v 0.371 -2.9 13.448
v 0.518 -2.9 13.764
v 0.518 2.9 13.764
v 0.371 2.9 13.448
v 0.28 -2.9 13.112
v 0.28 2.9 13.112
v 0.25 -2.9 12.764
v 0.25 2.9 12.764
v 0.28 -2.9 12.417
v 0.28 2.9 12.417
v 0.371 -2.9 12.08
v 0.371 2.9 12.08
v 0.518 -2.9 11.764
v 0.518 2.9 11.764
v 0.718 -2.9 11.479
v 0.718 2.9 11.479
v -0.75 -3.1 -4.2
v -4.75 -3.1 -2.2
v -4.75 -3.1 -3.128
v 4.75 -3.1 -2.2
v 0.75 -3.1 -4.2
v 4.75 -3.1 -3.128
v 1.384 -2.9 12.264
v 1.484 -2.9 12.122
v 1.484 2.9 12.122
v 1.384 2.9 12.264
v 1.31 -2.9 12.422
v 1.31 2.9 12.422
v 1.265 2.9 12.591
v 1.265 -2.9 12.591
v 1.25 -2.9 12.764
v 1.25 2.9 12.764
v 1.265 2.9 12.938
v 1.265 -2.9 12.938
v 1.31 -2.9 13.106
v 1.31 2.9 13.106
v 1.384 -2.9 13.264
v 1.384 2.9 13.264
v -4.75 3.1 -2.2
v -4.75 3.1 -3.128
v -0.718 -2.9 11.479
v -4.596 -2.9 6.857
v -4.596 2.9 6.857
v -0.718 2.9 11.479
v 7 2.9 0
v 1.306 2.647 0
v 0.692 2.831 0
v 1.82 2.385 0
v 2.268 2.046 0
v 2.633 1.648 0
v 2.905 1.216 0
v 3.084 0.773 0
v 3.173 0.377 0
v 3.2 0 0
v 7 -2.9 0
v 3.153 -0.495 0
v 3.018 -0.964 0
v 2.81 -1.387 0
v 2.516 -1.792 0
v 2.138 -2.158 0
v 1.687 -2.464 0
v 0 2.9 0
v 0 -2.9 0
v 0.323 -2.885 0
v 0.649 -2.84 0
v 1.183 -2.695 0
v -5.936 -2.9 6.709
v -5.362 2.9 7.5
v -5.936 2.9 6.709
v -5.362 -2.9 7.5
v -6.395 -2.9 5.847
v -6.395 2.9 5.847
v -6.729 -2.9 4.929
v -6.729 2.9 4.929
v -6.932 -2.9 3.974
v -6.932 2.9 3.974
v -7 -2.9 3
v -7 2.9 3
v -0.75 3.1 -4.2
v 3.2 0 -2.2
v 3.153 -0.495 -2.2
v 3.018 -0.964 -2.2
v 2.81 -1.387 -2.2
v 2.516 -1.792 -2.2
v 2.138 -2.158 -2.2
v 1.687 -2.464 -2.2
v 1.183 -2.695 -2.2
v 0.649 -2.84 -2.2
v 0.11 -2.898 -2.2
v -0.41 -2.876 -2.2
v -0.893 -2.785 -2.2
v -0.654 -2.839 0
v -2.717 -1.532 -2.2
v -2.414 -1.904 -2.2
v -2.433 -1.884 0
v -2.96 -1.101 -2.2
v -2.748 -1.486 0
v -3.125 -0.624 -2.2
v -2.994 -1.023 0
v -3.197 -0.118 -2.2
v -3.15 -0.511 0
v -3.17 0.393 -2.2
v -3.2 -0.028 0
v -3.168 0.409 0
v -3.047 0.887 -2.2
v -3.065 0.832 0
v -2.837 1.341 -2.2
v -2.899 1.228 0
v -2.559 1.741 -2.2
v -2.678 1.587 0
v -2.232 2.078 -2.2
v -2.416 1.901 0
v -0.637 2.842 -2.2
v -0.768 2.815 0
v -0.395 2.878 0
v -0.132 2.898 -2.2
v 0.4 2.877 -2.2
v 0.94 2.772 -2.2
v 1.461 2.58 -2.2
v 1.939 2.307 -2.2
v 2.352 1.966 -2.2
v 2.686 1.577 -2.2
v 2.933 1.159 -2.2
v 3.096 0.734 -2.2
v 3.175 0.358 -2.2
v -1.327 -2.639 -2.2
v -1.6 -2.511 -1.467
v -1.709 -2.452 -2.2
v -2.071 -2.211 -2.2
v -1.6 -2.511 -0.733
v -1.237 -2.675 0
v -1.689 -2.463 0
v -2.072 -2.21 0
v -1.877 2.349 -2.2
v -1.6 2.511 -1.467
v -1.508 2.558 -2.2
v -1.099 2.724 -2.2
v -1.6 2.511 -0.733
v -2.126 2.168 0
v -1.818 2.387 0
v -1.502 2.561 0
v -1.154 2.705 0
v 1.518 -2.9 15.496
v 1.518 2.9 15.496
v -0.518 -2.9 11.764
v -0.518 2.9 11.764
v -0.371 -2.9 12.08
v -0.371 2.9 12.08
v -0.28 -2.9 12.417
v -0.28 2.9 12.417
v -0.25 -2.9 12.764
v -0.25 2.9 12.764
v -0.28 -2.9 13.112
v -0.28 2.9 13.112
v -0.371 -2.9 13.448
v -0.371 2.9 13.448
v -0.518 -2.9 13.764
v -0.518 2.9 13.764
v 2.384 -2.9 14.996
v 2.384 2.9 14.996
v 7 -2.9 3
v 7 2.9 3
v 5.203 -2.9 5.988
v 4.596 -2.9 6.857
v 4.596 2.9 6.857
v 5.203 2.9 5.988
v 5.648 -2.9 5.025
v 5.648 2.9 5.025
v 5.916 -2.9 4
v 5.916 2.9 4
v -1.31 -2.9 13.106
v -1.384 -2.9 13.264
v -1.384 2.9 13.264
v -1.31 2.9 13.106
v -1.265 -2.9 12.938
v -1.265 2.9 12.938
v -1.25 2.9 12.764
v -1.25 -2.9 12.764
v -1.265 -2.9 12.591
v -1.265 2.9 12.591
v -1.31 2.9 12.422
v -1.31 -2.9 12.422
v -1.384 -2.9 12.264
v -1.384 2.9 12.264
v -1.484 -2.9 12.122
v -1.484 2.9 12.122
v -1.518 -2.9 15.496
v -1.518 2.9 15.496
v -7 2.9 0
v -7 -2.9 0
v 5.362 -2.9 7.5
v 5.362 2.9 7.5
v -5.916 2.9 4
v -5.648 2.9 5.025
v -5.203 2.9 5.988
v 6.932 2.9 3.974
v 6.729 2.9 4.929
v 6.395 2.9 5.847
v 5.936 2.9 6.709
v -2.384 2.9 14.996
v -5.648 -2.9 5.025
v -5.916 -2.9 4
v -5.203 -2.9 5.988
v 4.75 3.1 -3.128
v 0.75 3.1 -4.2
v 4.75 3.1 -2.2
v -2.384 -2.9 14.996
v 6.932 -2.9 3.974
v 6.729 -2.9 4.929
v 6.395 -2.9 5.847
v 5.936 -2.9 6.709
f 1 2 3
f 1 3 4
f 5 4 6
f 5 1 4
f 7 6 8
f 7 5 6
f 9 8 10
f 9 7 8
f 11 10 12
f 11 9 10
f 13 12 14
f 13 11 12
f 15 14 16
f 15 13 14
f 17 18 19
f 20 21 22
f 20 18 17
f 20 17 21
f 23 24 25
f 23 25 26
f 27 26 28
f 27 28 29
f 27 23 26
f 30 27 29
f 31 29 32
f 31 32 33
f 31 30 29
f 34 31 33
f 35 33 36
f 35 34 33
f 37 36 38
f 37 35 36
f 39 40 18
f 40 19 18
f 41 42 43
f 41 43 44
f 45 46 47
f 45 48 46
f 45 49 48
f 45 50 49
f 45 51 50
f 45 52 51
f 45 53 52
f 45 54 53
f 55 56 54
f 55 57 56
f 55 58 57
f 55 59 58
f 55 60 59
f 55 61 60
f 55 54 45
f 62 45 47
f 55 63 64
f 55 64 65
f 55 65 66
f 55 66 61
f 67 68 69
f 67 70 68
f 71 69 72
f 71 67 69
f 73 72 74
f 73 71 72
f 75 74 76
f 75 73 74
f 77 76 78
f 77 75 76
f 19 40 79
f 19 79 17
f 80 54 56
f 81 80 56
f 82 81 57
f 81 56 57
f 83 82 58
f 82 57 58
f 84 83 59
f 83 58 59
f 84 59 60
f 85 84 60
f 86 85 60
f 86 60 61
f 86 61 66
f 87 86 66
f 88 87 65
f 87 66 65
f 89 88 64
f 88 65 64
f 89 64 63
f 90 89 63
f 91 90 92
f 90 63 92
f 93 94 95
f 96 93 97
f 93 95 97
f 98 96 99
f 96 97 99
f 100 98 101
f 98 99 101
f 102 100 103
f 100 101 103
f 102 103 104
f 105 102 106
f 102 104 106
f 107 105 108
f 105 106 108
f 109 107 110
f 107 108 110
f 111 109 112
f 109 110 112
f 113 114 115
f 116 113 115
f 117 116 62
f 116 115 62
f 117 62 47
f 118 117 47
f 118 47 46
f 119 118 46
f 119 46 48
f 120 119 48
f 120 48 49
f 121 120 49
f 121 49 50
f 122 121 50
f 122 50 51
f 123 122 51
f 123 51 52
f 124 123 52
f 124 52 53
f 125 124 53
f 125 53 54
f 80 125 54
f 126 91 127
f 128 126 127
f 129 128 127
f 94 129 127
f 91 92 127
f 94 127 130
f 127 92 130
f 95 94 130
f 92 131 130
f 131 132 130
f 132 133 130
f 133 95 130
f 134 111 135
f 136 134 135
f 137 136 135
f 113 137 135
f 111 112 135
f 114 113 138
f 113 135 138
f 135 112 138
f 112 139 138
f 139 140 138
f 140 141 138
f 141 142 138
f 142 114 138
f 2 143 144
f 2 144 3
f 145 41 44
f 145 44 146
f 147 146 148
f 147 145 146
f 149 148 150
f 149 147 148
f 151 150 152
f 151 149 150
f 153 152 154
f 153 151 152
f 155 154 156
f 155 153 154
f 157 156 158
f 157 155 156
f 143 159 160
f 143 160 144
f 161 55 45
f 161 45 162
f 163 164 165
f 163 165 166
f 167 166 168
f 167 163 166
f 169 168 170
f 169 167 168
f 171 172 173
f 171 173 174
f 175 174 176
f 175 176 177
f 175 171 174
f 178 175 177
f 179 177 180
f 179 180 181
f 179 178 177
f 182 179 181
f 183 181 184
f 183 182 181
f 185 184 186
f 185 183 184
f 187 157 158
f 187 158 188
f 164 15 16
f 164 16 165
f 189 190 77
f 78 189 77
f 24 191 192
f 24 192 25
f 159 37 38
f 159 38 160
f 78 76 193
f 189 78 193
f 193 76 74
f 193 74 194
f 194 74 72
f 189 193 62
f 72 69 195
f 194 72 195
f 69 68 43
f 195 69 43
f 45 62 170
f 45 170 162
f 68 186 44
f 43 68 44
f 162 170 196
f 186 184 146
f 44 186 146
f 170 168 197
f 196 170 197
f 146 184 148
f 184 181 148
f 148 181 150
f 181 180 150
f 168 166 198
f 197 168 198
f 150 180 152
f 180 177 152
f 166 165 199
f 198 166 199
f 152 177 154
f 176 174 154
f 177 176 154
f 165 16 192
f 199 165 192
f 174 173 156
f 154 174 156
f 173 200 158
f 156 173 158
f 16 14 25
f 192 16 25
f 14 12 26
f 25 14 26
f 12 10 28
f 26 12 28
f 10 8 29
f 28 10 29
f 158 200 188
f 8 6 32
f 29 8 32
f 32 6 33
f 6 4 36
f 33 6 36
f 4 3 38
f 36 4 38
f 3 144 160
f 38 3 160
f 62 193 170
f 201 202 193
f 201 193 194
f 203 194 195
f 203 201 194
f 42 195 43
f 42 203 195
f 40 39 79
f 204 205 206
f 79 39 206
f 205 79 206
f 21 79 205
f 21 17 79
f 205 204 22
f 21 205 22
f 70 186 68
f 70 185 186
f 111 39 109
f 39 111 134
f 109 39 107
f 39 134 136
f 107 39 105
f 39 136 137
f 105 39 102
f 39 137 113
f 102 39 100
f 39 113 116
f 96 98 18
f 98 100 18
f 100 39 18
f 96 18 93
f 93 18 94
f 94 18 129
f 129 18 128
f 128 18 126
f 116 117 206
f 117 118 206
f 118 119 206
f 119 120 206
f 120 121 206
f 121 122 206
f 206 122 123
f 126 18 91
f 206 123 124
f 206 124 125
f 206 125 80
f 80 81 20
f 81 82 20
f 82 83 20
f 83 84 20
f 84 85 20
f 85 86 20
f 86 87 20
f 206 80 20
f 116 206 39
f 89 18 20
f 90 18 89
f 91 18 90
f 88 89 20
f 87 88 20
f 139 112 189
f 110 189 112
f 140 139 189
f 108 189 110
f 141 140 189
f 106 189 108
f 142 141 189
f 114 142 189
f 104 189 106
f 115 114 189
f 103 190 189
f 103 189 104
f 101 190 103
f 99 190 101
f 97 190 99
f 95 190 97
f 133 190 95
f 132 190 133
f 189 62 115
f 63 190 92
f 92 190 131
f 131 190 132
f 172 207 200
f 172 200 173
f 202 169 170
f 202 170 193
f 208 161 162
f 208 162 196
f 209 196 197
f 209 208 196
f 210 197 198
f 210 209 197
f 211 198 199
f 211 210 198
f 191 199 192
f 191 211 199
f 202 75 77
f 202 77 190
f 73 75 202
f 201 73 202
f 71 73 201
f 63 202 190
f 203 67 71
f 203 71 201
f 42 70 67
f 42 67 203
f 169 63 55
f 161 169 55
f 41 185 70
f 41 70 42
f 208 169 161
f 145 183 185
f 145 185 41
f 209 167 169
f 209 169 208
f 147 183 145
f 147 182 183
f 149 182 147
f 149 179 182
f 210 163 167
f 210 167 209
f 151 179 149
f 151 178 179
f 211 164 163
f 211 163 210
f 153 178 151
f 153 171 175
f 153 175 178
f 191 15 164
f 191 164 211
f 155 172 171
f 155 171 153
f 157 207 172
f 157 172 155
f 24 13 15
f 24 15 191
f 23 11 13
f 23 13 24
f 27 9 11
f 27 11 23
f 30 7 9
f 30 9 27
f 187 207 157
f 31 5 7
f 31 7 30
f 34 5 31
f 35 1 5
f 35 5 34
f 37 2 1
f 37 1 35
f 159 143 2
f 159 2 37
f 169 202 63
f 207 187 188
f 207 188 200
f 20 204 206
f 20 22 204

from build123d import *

# Parameters (mm, degrees)
F0_W     = 14
F0_H     = 3
F1_DEPTH = 2.9
F3_DEPTH = 2.2
F4_W     = 9.5
F4_H     = 2
F5_DEPTH = 3.1
F6_SIZE2 = 1.0717967697
F6_SIZE  = 4
F8_DEPTH = 2.9


with BuildPart() as f1:
    # F0 (on Front) → F1 (new body, symmetric)
    with BuildSketch(Plane.XZ):
        with Locations((0, 1.5)):
            Rectangle(F0_W, F0_H)
    extrude(amount=F1_DEPTH, both=True)

    # F2 (on face) → F3 (join)
    with BuildSketch(Plane(origin=(0, 0, 0), x_dir=(1, 0, 0), z_dir=(0, 0, -1))):
        with BuildLine():
            add(Edge.make_bspline(
                [(3.2, 0), (3.2, 5.0229473419), (-1.6, 2.511473671), (-6.4, 0), (-1.6, -2.511473671), (3.2, -5.0229473419), (3.2, 0)],
                knots=[0, 0, 0, 2.0943951024, 2.0943951024, 4.1887902048, 4.1887902048, 6.2831853072, 6.2831853072, 6.2831853072], degree=2, weights=[1, 0.5, 1, 0.5, 1, 0.5, 1]))
        make_face()
    extrude(amount=F3_DEPTH)

    # F4 (on Front) → F5 (join, symmetric)
    with BuildSketch(Plane.XZ):
        with Locations((0, -3.2)):
            Rectangle(F4_W, F4_H)
    extrude(amount=F5_DEPTH, both=True)

    # F6
    f6_edges = [f1.edges().sort_by_distance(p)[0] for p in [
        (4.75, 0, -4.2),
        (-4.75, 0, -4.2),
    ]]
    f6_side = f1.faces().sort_by_distance((0, 0, -4.2))[0]
    chamfer(f6_edges, length=F6_SIZE, length2=F6_SIZE2, reference=f6_side)

    # F7 (on Front) → F8 (join, symmetric)
    with BuildSketch(Plane.XZ):
        with BuildLine():
            Line((-7, 3), (7, 3))
            ThreePointArc((7, 3), (6.5778483455, 5.3941410033), (5.3623111018, 7.4995132678))
            Line((5.3623111018, 7.4995132678), (1.4839555569, 12.1215574219))
            ThreePointArc((1.4839555569, 12.1215574219), (1.2538053019, 12.6771892888), (1.3839745962, 13.2643450315))
            Line((1.3839745962, 13.2643450315), (2.3839745962, 14.9963958391))
            Line((2.3839745962, 14.9963958391), (1.5179493662, 15.4963957388))
            Line((1.5179493662, 15.4963957388), (0.5179493662, 13.7643449312))
            ThreePointArc((0.5179493662, 13.7643449312), (0.2576108037, 12.5900335635), (0.7179112675, 11.4787699411))
            Line((0.7179112675, 11.4787699411), (4.5962668124, 6.8567257871))
            ThreePointArc((4.5962668124, 6.8567257871), (5.4467953721, 5.5164305239), (5.9160800205, 3.9999997994))
            Line((5.9160800205, 3.9999997994), (-5.9160800205, 3.9999997994))
            ThreePointArc((-5.9160800205, 3.9999997994), (-5.4467953721, 5.5164305239), (-4.5962668124, 6.8567257871))
            Line((-4.5962668124, 6.8567257871), (-0.7179112675, 11.4787699411))
            ThreePointArc((-0.7179112675, 11.4787699411), (-0.2576108037, 12.5900335635), (-0.5179493662, 13.7643449312))
            Line((-0.5179493662, 13.7643449312), (-1.5179493662, 15.4963957388))
            Line((-1.5179493662, 15.4963957388), (-2.3839745962, 14.9963958391))
            Line((-2.3839745962, 14.9963958391), (-1.3839745962, 13.2643450315))
            ThreePointArc((-1.3839745962, 13.2643450315), (-1.2538053019, 12.6771892888), (-1.4839555569, 12.1215574219))
            Line((-1.4839555569, 12.1215574219), (-5.3623111018, 7.4995132678))
            ThreePointArc((-5.3623111018, 7.4995132678), (-6.5778483455, 5.3941410033), (-7, 3))
        make_face()
    extrude(amount=F8_DEPTH, both=True)


solid = f1.part
